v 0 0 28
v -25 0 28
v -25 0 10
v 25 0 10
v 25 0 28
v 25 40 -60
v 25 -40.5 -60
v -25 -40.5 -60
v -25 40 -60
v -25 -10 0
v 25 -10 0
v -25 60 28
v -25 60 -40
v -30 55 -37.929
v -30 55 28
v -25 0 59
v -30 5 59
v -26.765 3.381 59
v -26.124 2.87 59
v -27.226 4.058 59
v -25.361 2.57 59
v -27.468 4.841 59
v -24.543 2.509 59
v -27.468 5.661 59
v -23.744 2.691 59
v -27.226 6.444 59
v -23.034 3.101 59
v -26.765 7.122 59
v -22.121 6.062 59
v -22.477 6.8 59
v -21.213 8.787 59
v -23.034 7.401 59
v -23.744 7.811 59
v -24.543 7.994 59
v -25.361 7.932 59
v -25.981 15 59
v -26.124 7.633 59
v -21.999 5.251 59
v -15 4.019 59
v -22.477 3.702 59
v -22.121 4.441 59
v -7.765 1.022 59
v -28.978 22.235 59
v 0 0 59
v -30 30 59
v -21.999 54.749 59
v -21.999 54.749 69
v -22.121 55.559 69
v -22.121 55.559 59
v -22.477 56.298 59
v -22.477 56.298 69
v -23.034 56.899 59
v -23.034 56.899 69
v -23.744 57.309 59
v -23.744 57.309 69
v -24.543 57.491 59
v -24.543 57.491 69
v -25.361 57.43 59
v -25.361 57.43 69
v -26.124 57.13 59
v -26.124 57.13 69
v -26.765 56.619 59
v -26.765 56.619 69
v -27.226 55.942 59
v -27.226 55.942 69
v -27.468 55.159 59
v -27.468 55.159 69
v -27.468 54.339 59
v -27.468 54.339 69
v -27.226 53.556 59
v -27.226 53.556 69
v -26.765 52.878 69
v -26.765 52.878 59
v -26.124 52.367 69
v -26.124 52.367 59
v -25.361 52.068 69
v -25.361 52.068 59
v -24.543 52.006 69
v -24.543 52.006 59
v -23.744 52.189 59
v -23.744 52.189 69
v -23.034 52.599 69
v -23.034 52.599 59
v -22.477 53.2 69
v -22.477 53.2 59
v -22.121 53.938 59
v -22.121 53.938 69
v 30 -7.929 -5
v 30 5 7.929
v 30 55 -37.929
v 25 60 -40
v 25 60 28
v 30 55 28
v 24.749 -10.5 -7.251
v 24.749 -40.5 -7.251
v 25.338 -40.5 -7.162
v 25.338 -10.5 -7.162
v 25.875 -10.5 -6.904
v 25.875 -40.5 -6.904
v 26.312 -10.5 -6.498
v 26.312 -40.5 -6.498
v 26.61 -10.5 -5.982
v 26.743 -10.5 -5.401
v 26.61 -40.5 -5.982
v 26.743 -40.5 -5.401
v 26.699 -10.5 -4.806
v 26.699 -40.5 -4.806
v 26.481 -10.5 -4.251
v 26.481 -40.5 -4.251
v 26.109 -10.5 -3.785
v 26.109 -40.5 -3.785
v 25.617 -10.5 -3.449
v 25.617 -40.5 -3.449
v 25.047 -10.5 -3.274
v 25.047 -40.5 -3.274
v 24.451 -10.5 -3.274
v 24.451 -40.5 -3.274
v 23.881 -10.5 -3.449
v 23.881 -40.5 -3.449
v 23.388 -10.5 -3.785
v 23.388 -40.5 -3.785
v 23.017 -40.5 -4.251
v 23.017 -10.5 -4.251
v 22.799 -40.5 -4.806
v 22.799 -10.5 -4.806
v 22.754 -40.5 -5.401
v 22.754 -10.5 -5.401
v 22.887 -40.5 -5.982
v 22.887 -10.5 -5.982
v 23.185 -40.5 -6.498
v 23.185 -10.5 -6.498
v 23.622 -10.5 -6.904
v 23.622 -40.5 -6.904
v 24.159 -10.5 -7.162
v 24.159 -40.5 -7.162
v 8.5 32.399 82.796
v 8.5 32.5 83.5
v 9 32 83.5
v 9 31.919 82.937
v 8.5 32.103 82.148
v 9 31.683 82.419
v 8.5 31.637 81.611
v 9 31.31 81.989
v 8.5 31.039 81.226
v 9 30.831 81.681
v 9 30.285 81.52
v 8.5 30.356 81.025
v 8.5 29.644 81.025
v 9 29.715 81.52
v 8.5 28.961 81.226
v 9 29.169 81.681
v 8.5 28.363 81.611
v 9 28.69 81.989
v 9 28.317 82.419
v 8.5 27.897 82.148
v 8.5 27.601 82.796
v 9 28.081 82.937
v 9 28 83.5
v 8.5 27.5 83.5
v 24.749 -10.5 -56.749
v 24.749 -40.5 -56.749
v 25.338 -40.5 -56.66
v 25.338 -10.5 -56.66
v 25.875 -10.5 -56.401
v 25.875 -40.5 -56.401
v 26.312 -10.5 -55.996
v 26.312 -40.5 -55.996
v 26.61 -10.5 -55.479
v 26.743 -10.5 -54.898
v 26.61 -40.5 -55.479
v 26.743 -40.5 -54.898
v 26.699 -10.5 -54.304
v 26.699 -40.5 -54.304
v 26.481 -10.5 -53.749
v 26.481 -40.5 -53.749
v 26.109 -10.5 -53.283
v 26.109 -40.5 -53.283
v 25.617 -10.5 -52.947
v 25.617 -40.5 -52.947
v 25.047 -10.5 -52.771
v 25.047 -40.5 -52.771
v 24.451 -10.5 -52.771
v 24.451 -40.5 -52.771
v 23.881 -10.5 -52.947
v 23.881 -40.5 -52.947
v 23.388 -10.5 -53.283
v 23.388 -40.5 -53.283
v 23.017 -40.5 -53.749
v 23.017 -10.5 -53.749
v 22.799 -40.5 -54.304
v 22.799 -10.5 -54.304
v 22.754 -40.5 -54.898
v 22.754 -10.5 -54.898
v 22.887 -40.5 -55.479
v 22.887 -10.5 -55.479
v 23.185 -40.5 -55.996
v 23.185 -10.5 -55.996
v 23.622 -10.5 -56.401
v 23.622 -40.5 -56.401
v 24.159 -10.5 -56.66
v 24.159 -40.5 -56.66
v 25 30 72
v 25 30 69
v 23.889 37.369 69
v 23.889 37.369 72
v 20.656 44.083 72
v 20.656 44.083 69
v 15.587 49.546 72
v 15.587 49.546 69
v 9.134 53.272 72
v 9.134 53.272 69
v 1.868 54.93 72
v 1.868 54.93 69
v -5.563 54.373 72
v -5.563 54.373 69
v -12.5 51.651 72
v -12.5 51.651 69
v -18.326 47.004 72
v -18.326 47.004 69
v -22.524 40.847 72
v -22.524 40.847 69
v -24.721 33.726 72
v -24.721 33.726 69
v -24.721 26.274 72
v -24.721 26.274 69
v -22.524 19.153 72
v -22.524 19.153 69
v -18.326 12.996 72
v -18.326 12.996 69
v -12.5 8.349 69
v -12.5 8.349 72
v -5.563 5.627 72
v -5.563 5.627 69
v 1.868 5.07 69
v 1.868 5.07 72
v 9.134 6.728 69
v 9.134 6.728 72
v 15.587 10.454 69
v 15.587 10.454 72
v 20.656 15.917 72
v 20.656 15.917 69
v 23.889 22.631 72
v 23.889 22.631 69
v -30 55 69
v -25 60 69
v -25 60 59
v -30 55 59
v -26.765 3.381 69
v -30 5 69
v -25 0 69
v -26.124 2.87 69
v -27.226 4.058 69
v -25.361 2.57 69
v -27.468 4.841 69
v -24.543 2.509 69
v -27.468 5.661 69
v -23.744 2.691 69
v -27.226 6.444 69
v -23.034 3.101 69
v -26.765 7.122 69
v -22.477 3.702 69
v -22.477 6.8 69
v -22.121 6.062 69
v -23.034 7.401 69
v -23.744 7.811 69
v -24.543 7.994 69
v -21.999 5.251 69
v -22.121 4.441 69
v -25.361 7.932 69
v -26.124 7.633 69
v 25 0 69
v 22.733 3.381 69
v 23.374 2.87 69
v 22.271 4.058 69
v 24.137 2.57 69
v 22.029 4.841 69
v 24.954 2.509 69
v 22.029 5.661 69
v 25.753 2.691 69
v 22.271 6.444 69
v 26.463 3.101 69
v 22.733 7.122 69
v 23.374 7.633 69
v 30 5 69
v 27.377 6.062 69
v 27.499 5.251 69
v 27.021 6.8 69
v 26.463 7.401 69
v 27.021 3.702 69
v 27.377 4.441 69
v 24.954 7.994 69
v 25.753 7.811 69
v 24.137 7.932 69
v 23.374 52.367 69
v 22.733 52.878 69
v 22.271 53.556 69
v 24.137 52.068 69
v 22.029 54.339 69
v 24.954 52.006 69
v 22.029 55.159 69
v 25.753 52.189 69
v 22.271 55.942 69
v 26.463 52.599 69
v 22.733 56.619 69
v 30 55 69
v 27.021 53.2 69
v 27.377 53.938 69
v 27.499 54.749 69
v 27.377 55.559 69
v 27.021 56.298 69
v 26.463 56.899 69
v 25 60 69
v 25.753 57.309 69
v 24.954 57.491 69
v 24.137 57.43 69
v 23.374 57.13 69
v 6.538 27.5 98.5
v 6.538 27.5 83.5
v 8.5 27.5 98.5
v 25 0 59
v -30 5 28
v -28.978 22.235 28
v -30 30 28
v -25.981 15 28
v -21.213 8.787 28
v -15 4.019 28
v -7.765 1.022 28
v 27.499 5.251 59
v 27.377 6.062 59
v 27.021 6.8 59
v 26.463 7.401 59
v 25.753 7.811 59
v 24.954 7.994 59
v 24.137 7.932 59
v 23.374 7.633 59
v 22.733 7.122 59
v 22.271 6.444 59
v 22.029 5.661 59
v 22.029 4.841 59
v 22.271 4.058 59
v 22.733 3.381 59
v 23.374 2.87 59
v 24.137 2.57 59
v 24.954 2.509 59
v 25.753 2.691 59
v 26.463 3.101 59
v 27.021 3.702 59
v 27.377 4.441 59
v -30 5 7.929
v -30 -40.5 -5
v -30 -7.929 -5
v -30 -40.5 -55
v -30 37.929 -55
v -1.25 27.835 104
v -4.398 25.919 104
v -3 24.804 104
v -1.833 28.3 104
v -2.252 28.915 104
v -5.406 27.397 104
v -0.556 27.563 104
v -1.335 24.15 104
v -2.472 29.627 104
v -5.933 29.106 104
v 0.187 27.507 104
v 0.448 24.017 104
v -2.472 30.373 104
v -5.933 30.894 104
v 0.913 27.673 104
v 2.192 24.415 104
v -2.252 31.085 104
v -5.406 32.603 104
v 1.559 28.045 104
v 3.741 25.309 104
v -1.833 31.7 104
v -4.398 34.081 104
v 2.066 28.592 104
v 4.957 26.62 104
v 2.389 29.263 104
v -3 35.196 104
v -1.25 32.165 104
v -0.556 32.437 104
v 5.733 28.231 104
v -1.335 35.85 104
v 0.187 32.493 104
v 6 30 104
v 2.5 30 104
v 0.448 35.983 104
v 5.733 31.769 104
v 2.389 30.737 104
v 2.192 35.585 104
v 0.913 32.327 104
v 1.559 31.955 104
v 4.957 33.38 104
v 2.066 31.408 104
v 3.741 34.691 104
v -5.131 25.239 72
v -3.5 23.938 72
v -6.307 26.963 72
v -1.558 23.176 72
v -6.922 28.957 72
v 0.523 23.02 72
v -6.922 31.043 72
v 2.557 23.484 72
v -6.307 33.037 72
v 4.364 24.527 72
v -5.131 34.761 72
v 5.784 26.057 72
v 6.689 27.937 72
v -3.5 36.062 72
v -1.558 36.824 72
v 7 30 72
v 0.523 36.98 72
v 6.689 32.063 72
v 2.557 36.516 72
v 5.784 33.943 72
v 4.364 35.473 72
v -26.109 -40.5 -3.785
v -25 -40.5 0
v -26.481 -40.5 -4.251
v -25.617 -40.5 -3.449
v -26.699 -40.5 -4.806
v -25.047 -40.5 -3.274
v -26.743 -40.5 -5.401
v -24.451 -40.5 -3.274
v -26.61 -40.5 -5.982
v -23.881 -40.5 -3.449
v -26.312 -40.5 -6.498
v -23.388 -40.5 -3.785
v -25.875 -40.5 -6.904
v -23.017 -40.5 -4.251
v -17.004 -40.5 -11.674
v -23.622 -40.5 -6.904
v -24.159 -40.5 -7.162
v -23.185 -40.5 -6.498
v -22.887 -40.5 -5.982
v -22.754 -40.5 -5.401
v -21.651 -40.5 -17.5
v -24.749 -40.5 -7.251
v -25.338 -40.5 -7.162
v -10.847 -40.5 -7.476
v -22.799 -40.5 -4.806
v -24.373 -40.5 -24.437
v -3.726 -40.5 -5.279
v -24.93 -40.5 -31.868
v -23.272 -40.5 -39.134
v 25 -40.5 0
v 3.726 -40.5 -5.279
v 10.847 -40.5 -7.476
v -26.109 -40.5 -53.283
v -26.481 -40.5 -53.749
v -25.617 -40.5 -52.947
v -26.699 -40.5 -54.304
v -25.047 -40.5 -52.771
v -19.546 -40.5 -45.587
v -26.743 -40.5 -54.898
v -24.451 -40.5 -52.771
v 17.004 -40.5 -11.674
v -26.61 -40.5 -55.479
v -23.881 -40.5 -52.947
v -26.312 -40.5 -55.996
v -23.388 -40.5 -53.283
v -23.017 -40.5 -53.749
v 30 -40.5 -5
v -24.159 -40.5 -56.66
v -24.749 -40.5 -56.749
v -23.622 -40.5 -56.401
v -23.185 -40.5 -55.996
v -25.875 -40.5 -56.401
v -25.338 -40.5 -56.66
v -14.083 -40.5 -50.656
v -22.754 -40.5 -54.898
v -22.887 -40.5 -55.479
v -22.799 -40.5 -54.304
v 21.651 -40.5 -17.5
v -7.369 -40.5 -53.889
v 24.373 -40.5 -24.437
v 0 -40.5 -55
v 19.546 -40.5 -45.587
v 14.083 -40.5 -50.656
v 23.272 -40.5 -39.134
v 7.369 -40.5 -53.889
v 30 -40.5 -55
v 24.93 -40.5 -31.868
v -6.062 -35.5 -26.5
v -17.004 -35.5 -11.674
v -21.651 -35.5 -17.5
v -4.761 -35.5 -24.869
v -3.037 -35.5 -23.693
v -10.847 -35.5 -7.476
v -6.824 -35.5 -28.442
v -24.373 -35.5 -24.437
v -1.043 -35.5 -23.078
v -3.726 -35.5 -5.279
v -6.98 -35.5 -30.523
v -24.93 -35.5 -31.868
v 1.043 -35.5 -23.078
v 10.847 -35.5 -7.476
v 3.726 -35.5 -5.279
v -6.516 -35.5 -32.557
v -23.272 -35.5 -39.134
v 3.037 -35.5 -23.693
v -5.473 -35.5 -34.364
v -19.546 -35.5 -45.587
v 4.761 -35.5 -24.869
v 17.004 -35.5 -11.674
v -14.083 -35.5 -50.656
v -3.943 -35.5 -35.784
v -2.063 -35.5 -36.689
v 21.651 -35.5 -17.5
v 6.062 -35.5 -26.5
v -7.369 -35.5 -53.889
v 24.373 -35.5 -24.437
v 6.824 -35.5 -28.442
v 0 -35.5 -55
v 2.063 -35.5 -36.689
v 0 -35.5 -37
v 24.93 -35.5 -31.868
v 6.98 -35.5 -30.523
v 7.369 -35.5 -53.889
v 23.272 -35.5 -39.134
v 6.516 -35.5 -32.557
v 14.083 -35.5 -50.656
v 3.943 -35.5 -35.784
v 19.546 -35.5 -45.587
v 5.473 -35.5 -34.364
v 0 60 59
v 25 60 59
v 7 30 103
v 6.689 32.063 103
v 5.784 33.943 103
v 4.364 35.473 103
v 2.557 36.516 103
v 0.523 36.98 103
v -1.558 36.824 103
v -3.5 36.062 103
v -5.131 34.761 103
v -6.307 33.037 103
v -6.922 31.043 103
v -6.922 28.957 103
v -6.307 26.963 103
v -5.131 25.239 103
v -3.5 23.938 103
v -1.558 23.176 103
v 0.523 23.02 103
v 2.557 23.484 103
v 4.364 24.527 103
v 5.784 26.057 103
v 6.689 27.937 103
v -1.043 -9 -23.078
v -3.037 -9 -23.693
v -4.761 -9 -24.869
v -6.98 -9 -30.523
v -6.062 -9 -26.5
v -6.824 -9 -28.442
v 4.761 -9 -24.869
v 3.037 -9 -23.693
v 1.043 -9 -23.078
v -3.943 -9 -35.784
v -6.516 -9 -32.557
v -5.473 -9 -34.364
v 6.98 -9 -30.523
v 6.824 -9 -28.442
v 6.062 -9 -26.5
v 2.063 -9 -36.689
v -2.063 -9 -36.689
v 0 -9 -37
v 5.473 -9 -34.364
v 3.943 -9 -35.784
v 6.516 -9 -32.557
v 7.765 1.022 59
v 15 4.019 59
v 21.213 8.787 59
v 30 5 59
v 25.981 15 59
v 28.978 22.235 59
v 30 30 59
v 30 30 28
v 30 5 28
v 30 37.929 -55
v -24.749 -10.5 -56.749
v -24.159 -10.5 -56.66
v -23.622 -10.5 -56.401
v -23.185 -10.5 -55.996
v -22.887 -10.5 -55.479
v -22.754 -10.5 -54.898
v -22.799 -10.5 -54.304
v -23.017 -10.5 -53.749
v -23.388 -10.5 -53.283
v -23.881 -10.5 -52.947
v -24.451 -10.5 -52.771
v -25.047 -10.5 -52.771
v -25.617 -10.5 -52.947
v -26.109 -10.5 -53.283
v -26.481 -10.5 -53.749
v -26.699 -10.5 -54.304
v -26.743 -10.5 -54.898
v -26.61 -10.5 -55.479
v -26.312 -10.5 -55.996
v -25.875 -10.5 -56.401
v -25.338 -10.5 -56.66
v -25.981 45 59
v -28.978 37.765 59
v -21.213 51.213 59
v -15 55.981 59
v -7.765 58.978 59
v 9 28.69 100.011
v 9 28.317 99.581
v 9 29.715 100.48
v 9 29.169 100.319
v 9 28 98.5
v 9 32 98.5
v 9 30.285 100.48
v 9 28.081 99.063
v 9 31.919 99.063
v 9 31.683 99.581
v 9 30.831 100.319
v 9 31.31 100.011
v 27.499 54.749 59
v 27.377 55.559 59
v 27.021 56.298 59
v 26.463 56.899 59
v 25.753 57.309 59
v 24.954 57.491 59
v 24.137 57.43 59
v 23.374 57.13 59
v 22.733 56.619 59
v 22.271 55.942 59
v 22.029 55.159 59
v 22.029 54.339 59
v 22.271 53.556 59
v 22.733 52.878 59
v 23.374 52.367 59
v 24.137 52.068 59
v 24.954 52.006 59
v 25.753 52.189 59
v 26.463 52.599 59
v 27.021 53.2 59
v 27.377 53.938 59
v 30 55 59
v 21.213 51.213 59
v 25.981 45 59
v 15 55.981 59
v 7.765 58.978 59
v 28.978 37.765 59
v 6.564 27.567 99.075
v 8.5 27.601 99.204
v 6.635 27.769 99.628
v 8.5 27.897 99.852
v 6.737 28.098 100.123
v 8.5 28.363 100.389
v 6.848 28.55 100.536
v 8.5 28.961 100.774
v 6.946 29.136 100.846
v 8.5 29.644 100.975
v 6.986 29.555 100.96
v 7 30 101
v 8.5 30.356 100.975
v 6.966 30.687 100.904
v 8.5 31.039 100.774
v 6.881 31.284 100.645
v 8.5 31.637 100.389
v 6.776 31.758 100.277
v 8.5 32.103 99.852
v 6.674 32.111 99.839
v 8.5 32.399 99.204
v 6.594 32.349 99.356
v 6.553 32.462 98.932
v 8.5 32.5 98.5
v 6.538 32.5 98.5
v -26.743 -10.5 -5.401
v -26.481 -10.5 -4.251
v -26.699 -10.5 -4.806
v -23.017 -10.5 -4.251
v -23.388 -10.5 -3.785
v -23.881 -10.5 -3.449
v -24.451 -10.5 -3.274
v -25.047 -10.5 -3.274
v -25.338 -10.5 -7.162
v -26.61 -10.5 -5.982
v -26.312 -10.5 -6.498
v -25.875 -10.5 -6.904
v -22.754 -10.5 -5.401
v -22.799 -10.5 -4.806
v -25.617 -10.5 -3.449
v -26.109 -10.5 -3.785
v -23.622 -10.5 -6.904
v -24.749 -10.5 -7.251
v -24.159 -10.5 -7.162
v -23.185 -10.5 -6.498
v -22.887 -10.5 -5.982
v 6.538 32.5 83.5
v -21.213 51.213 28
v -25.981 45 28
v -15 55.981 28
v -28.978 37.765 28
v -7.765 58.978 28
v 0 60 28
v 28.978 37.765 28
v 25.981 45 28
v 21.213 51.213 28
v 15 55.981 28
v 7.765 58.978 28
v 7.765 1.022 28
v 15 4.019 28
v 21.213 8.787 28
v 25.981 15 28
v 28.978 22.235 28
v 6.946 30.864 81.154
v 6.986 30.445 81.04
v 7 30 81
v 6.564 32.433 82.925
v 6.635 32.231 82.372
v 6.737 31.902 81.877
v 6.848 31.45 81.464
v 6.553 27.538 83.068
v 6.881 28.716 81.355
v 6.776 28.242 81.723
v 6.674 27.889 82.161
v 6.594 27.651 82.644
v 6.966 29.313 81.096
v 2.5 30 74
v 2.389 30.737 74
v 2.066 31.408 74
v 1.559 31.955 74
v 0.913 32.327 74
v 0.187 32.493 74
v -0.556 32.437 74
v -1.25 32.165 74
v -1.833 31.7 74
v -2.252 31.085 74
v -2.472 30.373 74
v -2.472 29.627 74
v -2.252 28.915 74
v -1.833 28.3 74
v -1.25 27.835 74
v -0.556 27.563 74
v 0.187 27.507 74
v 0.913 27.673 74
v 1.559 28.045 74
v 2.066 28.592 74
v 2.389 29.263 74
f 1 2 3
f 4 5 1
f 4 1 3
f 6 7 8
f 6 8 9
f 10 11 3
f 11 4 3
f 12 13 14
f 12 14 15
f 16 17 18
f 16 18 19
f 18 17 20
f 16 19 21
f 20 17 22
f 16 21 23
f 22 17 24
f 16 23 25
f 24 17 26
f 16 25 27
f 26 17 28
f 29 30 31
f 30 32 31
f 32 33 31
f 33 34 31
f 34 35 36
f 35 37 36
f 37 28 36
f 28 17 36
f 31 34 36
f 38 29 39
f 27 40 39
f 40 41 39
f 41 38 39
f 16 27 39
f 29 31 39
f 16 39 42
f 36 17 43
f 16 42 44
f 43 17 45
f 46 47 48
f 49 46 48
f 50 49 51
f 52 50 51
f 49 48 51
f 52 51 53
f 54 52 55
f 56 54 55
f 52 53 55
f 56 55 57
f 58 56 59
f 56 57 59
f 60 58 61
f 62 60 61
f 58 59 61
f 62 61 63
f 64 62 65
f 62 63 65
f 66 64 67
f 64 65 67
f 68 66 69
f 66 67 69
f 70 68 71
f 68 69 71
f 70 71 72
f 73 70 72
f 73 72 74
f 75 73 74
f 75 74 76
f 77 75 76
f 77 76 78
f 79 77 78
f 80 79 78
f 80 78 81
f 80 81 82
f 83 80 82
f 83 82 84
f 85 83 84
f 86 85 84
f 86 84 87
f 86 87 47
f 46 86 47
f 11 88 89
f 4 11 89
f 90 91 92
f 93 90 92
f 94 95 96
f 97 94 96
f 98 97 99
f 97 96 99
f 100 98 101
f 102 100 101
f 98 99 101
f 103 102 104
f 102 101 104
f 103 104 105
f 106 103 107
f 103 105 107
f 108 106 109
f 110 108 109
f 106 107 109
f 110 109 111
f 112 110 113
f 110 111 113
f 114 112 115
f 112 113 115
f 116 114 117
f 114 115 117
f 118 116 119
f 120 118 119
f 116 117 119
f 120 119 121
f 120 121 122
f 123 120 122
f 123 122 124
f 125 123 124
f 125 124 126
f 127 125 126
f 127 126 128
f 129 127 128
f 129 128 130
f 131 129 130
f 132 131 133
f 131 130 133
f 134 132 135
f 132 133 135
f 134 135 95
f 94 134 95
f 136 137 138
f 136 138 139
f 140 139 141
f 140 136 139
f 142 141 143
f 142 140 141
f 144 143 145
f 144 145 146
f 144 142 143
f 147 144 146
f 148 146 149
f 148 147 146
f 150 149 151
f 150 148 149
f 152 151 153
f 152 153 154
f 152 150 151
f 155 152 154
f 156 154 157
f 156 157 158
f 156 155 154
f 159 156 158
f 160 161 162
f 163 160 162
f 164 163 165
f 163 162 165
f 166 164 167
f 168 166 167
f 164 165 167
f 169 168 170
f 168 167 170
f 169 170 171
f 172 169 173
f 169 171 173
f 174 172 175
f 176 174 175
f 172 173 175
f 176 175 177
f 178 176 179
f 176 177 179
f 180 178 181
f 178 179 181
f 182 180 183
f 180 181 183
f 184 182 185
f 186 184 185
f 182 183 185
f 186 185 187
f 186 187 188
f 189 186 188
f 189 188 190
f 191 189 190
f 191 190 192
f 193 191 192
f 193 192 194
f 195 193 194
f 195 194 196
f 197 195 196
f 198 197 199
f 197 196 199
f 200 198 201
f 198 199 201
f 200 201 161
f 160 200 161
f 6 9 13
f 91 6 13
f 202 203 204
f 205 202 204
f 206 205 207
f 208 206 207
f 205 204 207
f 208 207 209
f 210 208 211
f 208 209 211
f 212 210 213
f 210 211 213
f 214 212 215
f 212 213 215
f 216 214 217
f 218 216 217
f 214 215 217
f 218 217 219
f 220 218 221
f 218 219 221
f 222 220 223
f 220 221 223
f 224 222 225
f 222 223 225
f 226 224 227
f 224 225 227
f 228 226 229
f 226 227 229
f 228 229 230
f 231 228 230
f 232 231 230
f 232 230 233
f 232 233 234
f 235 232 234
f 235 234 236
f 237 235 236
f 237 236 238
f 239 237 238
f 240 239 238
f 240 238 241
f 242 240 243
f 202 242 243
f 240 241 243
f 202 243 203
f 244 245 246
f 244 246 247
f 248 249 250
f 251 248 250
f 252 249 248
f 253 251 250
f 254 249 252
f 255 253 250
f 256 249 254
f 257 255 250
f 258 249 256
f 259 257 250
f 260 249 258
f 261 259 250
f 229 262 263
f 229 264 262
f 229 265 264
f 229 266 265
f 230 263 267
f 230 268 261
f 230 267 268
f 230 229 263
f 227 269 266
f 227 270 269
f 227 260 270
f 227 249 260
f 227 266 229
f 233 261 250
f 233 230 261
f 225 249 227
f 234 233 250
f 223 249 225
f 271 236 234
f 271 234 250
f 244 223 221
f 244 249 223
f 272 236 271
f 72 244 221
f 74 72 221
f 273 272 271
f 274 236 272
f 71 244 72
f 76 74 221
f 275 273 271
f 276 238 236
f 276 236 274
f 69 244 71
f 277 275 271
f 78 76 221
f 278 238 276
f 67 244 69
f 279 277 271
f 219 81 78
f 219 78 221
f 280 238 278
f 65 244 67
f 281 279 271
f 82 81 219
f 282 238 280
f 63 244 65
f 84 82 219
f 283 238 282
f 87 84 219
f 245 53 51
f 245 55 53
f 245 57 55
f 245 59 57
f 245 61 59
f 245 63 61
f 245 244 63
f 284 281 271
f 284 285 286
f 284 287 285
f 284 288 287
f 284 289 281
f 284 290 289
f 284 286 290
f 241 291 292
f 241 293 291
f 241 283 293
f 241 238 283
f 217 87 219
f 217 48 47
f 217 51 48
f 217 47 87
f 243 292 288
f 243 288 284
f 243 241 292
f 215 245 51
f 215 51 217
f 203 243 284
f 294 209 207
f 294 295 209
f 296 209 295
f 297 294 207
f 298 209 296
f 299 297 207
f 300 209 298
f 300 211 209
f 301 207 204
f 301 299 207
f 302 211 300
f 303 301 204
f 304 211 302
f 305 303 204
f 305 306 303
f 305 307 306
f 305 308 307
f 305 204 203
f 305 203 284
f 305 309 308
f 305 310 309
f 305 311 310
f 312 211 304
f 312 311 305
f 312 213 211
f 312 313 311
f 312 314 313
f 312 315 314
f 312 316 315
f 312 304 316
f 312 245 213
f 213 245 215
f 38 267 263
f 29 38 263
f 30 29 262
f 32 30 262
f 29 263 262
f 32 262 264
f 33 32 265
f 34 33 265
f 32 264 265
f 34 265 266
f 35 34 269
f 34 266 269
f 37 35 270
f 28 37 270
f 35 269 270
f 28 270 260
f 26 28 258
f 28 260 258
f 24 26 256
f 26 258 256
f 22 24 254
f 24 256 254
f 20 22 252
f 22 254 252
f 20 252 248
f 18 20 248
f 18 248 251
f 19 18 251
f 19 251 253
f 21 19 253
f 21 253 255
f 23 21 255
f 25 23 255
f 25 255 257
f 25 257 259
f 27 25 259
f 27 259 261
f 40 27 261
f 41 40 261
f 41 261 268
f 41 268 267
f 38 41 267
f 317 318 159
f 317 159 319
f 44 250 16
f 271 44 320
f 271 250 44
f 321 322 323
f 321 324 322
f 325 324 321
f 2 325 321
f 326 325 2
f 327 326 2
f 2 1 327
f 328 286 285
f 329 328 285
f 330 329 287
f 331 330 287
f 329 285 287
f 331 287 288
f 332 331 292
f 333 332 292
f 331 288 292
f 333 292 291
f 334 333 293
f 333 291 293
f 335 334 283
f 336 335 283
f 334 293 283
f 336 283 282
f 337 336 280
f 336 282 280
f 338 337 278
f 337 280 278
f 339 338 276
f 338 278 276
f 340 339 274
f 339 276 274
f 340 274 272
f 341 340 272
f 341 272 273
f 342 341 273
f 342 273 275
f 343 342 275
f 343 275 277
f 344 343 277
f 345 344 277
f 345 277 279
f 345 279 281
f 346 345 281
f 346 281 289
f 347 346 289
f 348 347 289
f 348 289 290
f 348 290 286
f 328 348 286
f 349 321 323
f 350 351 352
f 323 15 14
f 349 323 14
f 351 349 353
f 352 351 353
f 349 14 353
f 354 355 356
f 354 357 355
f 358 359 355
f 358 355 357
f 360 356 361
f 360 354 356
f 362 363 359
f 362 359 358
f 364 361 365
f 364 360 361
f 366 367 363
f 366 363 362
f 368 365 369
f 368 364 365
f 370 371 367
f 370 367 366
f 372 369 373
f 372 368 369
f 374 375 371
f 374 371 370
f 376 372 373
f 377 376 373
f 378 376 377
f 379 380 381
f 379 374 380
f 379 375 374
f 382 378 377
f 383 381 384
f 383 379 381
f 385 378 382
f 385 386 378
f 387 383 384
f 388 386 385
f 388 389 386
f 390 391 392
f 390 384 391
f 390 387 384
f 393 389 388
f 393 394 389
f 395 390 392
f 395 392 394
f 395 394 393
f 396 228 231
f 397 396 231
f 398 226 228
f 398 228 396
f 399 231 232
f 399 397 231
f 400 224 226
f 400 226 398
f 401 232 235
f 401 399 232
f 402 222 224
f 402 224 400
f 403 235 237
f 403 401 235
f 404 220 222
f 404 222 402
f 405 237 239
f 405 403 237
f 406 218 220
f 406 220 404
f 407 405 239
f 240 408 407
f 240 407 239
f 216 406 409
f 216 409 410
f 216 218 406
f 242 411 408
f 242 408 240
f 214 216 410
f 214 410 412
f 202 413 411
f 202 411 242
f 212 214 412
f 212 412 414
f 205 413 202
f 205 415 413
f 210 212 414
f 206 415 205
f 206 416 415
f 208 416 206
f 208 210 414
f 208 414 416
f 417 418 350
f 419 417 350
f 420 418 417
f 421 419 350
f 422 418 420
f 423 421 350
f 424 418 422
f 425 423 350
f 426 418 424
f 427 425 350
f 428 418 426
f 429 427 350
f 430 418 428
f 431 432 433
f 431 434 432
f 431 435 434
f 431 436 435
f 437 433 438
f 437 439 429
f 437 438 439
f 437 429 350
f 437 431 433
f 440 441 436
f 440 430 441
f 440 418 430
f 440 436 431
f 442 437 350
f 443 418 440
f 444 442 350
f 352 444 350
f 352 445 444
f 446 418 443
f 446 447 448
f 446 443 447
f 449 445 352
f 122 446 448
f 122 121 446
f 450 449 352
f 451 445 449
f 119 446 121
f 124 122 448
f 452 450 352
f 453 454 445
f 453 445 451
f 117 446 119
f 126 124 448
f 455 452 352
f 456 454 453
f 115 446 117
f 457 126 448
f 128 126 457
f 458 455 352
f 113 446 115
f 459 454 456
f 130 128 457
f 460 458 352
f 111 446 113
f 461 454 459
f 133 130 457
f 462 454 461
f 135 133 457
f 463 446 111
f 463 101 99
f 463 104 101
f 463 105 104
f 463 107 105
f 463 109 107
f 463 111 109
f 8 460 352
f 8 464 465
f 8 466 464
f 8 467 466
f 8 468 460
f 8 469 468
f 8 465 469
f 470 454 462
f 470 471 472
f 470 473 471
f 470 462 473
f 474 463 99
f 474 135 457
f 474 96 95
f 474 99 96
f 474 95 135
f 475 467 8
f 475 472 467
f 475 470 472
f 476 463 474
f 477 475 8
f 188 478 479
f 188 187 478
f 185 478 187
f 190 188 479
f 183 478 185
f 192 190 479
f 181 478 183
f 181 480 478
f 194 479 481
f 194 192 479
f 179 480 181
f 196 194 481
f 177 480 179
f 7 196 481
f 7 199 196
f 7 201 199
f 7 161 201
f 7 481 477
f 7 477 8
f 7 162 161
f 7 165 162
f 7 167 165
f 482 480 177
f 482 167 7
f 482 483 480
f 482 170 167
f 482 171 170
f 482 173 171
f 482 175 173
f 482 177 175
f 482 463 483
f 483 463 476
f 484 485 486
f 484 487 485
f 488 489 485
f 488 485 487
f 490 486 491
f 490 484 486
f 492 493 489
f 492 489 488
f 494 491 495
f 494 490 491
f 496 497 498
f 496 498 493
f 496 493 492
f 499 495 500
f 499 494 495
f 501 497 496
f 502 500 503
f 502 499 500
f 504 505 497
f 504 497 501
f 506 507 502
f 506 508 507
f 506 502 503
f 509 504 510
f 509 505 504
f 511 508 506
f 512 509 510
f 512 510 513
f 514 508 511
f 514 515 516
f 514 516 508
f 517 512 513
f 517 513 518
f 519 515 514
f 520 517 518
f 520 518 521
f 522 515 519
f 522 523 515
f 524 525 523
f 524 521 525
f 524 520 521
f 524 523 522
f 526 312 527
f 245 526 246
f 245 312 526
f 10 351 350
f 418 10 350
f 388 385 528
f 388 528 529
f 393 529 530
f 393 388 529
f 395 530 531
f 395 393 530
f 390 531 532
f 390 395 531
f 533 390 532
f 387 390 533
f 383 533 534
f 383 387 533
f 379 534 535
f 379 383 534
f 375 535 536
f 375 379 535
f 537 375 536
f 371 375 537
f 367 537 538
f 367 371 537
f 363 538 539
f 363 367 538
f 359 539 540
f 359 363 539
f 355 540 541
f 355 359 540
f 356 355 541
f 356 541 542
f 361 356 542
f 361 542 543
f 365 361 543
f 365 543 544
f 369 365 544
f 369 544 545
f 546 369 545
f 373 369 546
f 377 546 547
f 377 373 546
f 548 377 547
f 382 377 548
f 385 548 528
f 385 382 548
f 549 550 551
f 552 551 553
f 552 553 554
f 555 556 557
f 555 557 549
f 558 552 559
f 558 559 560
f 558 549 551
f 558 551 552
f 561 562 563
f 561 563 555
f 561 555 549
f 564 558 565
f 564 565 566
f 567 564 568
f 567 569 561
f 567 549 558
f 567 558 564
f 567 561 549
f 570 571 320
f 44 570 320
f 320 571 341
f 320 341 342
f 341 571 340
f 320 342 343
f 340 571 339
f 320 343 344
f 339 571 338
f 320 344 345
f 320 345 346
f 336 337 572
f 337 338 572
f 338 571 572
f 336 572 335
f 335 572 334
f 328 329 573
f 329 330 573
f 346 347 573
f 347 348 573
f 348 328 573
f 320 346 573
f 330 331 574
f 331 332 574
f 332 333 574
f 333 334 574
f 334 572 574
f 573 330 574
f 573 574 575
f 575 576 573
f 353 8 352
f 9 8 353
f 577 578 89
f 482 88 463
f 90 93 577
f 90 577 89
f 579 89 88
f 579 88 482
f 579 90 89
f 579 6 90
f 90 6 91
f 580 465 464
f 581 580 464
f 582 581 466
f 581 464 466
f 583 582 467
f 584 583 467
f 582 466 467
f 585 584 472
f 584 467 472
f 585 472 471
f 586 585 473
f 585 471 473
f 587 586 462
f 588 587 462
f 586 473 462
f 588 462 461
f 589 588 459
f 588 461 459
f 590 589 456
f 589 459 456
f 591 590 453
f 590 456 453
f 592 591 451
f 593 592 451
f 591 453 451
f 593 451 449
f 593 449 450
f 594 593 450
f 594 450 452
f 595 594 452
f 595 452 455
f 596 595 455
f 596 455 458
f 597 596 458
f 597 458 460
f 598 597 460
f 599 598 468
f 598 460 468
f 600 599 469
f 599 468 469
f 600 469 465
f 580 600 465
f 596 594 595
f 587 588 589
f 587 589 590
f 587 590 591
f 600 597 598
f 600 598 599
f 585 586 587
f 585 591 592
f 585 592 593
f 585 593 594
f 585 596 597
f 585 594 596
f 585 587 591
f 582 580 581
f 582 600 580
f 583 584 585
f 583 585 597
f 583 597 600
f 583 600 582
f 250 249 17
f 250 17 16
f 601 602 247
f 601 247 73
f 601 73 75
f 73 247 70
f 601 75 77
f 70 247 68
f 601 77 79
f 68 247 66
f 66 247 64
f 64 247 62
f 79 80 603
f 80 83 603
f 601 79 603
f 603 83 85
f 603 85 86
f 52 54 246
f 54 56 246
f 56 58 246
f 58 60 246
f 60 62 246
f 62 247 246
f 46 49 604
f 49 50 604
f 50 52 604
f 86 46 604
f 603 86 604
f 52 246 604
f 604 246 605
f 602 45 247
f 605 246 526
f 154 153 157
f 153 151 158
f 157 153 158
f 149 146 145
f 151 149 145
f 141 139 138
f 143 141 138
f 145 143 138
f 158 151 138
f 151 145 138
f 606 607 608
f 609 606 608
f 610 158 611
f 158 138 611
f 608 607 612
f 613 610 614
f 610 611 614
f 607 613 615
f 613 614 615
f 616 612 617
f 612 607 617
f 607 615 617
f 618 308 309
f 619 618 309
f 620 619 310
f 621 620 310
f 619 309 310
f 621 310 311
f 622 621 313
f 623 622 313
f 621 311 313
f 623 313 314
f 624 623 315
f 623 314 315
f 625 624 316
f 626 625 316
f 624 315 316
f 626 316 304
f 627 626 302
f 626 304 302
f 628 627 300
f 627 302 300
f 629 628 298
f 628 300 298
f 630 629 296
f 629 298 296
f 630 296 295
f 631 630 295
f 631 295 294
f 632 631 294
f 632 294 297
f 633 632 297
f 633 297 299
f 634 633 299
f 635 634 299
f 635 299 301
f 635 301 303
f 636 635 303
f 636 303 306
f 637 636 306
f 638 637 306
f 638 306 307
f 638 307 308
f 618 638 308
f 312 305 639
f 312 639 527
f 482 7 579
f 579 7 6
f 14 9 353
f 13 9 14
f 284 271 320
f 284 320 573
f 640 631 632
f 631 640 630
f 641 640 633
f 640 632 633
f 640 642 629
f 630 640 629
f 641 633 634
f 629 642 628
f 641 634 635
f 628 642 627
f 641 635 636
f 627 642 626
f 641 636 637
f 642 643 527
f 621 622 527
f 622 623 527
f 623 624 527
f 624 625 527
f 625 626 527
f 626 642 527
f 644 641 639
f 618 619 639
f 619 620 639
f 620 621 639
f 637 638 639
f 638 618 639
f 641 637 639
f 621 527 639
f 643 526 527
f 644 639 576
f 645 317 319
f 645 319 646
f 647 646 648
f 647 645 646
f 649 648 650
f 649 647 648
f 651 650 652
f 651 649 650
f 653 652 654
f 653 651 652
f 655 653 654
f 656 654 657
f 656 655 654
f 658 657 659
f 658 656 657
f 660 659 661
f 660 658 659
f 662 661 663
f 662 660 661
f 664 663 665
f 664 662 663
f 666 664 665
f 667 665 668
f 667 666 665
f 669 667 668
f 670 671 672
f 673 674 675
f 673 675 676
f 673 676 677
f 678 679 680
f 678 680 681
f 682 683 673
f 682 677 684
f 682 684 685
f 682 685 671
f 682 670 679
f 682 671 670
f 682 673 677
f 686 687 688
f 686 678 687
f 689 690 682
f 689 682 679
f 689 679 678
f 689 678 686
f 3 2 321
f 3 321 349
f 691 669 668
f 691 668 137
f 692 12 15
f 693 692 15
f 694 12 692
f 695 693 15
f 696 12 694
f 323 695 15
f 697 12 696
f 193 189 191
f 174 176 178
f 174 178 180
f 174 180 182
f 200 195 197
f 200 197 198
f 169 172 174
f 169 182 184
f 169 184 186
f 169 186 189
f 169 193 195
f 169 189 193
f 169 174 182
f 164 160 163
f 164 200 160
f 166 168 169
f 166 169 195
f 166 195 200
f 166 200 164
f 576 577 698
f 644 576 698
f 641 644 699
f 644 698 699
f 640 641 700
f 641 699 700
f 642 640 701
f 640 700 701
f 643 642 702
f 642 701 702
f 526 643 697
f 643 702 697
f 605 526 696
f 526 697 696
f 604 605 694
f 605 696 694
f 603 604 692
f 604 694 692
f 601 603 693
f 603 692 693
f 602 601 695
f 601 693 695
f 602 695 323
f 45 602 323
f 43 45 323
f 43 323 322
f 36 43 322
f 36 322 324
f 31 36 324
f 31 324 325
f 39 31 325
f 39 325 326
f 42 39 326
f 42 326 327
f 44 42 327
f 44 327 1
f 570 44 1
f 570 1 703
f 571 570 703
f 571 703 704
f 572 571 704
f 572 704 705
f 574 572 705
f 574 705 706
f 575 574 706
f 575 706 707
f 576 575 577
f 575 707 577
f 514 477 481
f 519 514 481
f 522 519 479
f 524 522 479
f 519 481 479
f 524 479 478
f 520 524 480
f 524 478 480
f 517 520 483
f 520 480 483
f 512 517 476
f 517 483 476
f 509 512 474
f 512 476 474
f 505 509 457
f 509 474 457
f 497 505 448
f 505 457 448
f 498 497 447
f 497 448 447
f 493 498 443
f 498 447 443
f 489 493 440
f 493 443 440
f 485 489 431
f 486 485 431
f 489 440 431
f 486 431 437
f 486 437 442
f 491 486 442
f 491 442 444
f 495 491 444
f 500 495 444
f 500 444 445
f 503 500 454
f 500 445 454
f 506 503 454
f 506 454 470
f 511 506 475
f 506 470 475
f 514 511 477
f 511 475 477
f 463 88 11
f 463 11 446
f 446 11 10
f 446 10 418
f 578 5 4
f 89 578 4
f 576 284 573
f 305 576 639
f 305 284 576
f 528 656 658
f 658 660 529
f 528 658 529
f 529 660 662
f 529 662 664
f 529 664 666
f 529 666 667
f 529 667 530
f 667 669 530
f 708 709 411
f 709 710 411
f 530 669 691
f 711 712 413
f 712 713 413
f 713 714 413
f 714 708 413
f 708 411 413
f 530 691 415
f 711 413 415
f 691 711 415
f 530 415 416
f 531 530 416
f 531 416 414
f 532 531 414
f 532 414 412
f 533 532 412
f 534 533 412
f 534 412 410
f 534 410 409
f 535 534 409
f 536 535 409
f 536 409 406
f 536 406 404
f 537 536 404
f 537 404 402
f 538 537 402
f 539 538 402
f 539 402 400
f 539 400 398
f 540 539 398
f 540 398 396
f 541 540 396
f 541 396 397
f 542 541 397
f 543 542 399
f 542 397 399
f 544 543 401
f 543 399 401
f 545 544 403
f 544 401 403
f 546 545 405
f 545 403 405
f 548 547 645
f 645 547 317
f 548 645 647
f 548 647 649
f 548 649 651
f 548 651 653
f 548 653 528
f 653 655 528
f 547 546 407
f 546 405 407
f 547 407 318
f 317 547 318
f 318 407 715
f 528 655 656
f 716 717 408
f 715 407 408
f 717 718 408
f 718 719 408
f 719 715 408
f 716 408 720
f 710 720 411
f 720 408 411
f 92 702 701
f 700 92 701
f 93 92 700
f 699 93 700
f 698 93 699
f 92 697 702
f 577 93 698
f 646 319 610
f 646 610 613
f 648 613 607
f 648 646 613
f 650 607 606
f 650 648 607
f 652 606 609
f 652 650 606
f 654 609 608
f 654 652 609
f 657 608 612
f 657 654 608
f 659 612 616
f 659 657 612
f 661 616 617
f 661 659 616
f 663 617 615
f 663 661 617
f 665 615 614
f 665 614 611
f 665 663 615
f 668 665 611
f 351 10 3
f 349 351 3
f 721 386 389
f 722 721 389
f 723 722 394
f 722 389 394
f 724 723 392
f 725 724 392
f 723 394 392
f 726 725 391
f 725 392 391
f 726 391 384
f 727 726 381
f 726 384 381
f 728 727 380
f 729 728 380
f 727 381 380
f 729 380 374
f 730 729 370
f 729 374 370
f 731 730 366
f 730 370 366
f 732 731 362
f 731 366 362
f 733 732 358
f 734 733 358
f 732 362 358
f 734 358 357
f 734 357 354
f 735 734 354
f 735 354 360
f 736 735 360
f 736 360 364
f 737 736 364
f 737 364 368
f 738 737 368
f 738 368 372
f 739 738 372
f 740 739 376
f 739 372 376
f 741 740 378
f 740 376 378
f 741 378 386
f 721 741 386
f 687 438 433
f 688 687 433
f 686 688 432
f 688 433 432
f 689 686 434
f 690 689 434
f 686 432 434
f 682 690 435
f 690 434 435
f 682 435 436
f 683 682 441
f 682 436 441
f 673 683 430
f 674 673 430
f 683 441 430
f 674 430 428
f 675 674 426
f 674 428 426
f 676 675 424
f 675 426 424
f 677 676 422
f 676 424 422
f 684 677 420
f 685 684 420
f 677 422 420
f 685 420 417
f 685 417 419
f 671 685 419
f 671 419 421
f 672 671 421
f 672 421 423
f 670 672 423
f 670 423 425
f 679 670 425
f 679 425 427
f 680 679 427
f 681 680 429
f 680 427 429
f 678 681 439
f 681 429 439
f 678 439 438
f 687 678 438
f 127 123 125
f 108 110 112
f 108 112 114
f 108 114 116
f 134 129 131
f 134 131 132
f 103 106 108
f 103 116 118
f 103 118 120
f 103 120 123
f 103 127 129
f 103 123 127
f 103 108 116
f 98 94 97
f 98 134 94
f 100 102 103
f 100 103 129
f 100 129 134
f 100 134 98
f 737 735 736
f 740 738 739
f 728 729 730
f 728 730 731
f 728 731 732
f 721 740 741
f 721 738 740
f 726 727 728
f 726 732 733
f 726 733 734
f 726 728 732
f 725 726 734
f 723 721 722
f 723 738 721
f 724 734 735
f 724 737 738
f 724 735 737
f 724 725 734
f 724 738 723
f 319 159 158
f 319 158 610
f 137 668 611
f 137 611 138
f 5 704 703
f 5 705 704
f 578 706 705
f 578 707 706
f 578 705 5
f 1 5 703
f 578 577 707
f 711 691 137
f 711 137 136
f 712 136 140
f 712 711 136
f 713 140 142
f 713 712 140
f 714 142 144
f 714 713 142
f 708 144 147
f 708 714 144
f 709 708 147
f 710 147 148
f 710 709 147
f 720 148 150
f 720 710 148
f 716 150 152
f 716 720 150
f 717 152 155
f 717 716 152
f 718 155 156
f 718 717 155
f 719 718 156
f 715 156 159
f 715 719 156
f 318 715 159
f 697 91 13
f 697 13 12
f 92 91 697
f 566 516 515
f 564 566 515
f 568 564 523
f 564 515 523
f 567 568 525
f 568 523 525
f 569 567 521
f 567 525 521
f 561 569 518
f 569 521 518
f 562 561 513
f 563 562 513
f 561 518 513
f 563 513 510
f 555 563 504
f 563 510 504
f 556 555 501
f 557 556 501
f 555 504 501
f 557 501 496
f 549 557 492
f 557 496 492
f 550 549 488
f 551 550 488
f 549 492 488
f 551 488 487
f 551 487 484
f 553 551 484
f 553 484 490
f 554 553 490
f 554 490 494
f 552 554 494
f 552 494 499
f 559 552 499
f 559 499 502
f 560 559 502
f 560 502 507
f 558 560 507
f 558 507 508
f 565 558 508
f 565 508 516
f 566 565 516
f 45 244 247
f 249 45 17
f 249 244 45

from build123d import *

# Parameters (mm, degrees)
EXTRUDE_1_DEPTH     = 30
CHAMFER_1_SIZE      = 10
CHAMFER_2_SIZE      = 5
SKETCH_2_R          = 30
EXTRUDE_2_DEPTH     = 41
EXTRUDE_3_DEPTH     = 10
SKETCH_4_R          = 25
EXTRUDE_4_DEPTH     = 3
SKETCH_5_R          = 7
EXTRUDE_5_DEPTH     = 35
CUT_EXTRUDE_1_REACH = 147.399
SKETCH_6_R          = 2.75
SKETCH_8_R          = 25
CUT_EXTRUDE_2_DEPTH = 5
SKETCH_9_R          = 7
CUT_EXTRUDE_3_DEPTH = 31.5
EXTRUDE_6_DEPTH     = 9
CHAMFER_3_SIZE      = 0.5
SKETCH_11_R         = 2
CUT_EXTRUDE_4_DEPTH = 30
SKETCH_12_R         = 2.5
CUT_EXTRUDE_5_DEPTH = 30
CHAMFER_4_SIZE      = 1


with BuildPart() as part:
    # 草图1 → 凸台-拉伸1 (new, symmetric)
    with BuildSketch(Plane(origin=(0, 0, 0), x_dir=(0, 0, -1), z_dir=(1, 0, 0))):
        Polygon((0, 0), (0, -40.5), (60, -40.5), (60, 40), (40, 60), (-28, 60), (-28, 0), align=None)
    extrude(amount=EXTRUDE_1_DEPTH, both=True)

    # 倒角1
    chamfer_1_edges = [part.edges().sort_by_distance(p)[0] for p in [
        (0, 0, 0),
    ]]
    chamfer(chamfer_1_edges, length=CHAMFER_1_SIZE)

    # 倒角2
    chamfer_2_edges = [part.edges().sort_by_distance(p)[0] for p in [
        (-30, 0, 19),
        (30, -0.25, -60),
        (30, 50, -50),
        (-30, -25.25, 0),
        (30, -25.25, 0),
        (-30, -5, 5),
        (30, -5, 5),
        (30, 60, -6),
        (30, 0, 19),
        (-30, 60, -6),
        (-30, 50, -50),
        (-30, -0.25, -60),
    ]]
    chamfer(chamfer_2_edges, length=CHAMFER_2_SIZE)

    # 草图2 → 凸台-拉伸2 (add)
    with BuildSketch(Plane.XY.offset(28)):
        with Locations((0, 30)):
            Circle(SKETCH_2_R)
    extrude(amount=EXTRUDE_2_DEPTH)

    # 草图3 → 凸台-拉伸3 (add)
    with BuildSketch(Plane.XY.offset(69)):
        Polygon((-30, 30), (-30, 5), (-25, 0), (25, 0), (30, 5), (30, 30), (30, 55), (25, 60), (0, 60), (-25, 60), (-30, 55), align=None)
    extrude(amount=-EXTRUDE_3_DEPTH)

    # 草图4 → 凸台-拉伸4 (add)
    with BuildSketch(Plane.XY.offset(69)):
        with Locations((0, 30)):
            Circle(SKETCH_4_R)
    extrude(amount=EXTRUDE_4_DEPTH)

    # 草图5 → 凸台-拉伸5 (add)
    with BuildSketch(Plane.XY.offset(69)):
        with Locations((0, 30)):
            Circle(SKETCH_5_R)
    extrude(amount=EXTRUDE_5_DEPTH)

    # 草图6 → 切除-拉伸1 (cut, up to next)
    with BuildSketch(Plane.XY.offset(69), mode=Mode.PRIVATE) as cut_extrude_1_sk1:
        with Locations((-24.748737342, 54.748737342)):
            Circle(SKETCH_6_R)
    cut_extrude_1_tool1 = extrude(cut_extrude_1_sk1.sketch, amount=-CUT_EXTRUDE_1_REACH, mode=Mode.PRIVATE) & part.part
    # 草图6 → 切除-拉伸1 (cut, up to next)
    with BuildSketch(Plane.XY.offset(69), mode=Mode.PRIVATE) as cut_extrude_1_sk2:
        with Locations((24.748737342, 54.748737342)):
            Circle(SKETCH_6_R)
    cut_extrude_1_tool2 = extrude(cut_extrude_1_sk2.sketch, amount=-CUT_EXTRUDE_1_REACH, mode=Mode.PRIVATE) & part.part
    # 草图6 → 切除-拉伸1 (cut, up to next)
    with BuildSketch(Plane.XY.offset(69), mode=Mode.PRIVATE) as cut_extrude_1_sk3:
        with Locations((24.748737342, 5.251262658)):
            Circle(SKETCH_6_R)
    cut_extrude_1_tool3 = extrude(cut_extrude_1_sk3.sketch, amount=-CUT_EXTRUDE_1_REACH, mode=Mode.PRIVATE) & part.part
    # 草图6 → 切除-拉伸1 (cut, up to next)
    with BuildSketch(Plane.XY.offset(69), mode=Mode.PRIVATE) as cut_extrude_1_sk4:
        with Locations((-24.748737342, 5.251262658)):
            Circle(SKETCH_6_R)
    cut_extrude_1_tool4 = extrude(cut_extrude_1_sk4.sketch, amount=-CUT_EXTRUDE_1_REACH, mode=Mode.PRIVATE) & part.part
    add(cut_extrude_1_tool1.solids().sort_by_distance((-24.748737, 54.748737, 69))[0], mode=Mode.SUBTRACT)
    add(cut_extrude_1_tool2.solids().sort_by_distance((24.748737, 54.748737, 69))[0], mode=Mode.SUBTRACT)
    add(cut_extrude_1_tool3.solids().sort_by_distance((24.748737, 5.251263, 69))[0], mode=Mode.SUBTRACT)
    add(cut_extrude_1_tool4.solids().sort_by_distance((-24.748737, 5.251263, 69))[0], mode=Mode.SUBTRACT)

    # 草图8 → 切除-拉伸2 (cut)
    with BuildSketch(Plane.XZ.offset(40.5)):
        with Locations(Location((0, -30, 0), (0, 0, 270))):
            Circle(SKETCH_8_R)
    extrude(amount=-CUT_EXTRUDE_2_DEPTH, mode=Mode.SUBTRACT)

    # 草图9 → 切除-拉伸3 (cut)
    with BuildSketch(Plane.XZ.offset(40.5)):
        with Locations(Location((0, -30, 0), (0, 0, 270))):
            Circle(SKETCH_9_R)
    extrude(amount=-CUT_EXTRUDE_3_DEPTH, mode=Mode.SUBTRACT)

    # 草图10 → 凸台-拉伸6 (add)
    with BuildSketch(Plane(origin=(0, 0, 0), x_dir=(0, 0, -1), z_dir=(1, 0, 0))):
        with BuildLine():
            Line((-98.5, 32.5), (-83.5, 32.5))
            ThreePointArc((-83.5, 32.5), (-81, 30), (-83.5, 27.5))
            Line((-83.5, 27.5), (-98.5, 27.5))
            ThreePointArc((-98.5, 27.5), (-101, 30), (-98.5, 32.5))
        make_face()
    extrude(amount=EXTRUDE_6_DEPTH)

    # 倒角3
    chamfer_3_edges = [part.edges().sort_by_distance(p)[0] for p in [
        (9, 30, 101),
        (9, 27.5, 91),
        (9, 30, 81),
        (9, 32.5, 91),
    ]]
    chamfer(chamfer_3_edges, length=CHAMFER_3_SIZE)

    # 草图11 → 切除-拉伸4 (cut)
    with BuildSketch(Plane.XZ.offset(40.5)):
        with Locations(Location((-24.748737342, -5.251262658, 0), (0, 0, 270))):
            Circle(SKETCH_11_R)
        with Locations(Location((24.748737342, -5.251262658, 0), (0, 0, 270))):
            Circle(SKETCH_11_R)
        with Locations(Location((24.748737342, -54.748737342, 0), (0, 0, 270))):
            Circle(SKETCH_11_R)
        with Locations(Location((-24.748737342, -54.748737342, 0), (0, 0, 270))):
            Circle(SKETCH_11_R)
    extrude(amount=-CUT_EXTRUDE_4_DEPTH, mode=Mode.SUBTRACT)

    # 草图12 → 切除-拉伸5 (cut)
    with BuildSketch(Plane.XY.offset(104)):
        with Locations((0, 30)):
            Circle(SKETCH_12_R)
    extrude(amount=-CUT_EXTRUDE_5_DEPTH, mode=Mode.SUBTRACT)

    # 倒角4
    chamfer_4_edges = [part.edges().sort_by_distance(p)[0] for p in [
        (-7, 30, 104),
    ]]
    chamfer(chamfer_4_edges, length=CHAMFER_4_SIZE)


solid = part.part
